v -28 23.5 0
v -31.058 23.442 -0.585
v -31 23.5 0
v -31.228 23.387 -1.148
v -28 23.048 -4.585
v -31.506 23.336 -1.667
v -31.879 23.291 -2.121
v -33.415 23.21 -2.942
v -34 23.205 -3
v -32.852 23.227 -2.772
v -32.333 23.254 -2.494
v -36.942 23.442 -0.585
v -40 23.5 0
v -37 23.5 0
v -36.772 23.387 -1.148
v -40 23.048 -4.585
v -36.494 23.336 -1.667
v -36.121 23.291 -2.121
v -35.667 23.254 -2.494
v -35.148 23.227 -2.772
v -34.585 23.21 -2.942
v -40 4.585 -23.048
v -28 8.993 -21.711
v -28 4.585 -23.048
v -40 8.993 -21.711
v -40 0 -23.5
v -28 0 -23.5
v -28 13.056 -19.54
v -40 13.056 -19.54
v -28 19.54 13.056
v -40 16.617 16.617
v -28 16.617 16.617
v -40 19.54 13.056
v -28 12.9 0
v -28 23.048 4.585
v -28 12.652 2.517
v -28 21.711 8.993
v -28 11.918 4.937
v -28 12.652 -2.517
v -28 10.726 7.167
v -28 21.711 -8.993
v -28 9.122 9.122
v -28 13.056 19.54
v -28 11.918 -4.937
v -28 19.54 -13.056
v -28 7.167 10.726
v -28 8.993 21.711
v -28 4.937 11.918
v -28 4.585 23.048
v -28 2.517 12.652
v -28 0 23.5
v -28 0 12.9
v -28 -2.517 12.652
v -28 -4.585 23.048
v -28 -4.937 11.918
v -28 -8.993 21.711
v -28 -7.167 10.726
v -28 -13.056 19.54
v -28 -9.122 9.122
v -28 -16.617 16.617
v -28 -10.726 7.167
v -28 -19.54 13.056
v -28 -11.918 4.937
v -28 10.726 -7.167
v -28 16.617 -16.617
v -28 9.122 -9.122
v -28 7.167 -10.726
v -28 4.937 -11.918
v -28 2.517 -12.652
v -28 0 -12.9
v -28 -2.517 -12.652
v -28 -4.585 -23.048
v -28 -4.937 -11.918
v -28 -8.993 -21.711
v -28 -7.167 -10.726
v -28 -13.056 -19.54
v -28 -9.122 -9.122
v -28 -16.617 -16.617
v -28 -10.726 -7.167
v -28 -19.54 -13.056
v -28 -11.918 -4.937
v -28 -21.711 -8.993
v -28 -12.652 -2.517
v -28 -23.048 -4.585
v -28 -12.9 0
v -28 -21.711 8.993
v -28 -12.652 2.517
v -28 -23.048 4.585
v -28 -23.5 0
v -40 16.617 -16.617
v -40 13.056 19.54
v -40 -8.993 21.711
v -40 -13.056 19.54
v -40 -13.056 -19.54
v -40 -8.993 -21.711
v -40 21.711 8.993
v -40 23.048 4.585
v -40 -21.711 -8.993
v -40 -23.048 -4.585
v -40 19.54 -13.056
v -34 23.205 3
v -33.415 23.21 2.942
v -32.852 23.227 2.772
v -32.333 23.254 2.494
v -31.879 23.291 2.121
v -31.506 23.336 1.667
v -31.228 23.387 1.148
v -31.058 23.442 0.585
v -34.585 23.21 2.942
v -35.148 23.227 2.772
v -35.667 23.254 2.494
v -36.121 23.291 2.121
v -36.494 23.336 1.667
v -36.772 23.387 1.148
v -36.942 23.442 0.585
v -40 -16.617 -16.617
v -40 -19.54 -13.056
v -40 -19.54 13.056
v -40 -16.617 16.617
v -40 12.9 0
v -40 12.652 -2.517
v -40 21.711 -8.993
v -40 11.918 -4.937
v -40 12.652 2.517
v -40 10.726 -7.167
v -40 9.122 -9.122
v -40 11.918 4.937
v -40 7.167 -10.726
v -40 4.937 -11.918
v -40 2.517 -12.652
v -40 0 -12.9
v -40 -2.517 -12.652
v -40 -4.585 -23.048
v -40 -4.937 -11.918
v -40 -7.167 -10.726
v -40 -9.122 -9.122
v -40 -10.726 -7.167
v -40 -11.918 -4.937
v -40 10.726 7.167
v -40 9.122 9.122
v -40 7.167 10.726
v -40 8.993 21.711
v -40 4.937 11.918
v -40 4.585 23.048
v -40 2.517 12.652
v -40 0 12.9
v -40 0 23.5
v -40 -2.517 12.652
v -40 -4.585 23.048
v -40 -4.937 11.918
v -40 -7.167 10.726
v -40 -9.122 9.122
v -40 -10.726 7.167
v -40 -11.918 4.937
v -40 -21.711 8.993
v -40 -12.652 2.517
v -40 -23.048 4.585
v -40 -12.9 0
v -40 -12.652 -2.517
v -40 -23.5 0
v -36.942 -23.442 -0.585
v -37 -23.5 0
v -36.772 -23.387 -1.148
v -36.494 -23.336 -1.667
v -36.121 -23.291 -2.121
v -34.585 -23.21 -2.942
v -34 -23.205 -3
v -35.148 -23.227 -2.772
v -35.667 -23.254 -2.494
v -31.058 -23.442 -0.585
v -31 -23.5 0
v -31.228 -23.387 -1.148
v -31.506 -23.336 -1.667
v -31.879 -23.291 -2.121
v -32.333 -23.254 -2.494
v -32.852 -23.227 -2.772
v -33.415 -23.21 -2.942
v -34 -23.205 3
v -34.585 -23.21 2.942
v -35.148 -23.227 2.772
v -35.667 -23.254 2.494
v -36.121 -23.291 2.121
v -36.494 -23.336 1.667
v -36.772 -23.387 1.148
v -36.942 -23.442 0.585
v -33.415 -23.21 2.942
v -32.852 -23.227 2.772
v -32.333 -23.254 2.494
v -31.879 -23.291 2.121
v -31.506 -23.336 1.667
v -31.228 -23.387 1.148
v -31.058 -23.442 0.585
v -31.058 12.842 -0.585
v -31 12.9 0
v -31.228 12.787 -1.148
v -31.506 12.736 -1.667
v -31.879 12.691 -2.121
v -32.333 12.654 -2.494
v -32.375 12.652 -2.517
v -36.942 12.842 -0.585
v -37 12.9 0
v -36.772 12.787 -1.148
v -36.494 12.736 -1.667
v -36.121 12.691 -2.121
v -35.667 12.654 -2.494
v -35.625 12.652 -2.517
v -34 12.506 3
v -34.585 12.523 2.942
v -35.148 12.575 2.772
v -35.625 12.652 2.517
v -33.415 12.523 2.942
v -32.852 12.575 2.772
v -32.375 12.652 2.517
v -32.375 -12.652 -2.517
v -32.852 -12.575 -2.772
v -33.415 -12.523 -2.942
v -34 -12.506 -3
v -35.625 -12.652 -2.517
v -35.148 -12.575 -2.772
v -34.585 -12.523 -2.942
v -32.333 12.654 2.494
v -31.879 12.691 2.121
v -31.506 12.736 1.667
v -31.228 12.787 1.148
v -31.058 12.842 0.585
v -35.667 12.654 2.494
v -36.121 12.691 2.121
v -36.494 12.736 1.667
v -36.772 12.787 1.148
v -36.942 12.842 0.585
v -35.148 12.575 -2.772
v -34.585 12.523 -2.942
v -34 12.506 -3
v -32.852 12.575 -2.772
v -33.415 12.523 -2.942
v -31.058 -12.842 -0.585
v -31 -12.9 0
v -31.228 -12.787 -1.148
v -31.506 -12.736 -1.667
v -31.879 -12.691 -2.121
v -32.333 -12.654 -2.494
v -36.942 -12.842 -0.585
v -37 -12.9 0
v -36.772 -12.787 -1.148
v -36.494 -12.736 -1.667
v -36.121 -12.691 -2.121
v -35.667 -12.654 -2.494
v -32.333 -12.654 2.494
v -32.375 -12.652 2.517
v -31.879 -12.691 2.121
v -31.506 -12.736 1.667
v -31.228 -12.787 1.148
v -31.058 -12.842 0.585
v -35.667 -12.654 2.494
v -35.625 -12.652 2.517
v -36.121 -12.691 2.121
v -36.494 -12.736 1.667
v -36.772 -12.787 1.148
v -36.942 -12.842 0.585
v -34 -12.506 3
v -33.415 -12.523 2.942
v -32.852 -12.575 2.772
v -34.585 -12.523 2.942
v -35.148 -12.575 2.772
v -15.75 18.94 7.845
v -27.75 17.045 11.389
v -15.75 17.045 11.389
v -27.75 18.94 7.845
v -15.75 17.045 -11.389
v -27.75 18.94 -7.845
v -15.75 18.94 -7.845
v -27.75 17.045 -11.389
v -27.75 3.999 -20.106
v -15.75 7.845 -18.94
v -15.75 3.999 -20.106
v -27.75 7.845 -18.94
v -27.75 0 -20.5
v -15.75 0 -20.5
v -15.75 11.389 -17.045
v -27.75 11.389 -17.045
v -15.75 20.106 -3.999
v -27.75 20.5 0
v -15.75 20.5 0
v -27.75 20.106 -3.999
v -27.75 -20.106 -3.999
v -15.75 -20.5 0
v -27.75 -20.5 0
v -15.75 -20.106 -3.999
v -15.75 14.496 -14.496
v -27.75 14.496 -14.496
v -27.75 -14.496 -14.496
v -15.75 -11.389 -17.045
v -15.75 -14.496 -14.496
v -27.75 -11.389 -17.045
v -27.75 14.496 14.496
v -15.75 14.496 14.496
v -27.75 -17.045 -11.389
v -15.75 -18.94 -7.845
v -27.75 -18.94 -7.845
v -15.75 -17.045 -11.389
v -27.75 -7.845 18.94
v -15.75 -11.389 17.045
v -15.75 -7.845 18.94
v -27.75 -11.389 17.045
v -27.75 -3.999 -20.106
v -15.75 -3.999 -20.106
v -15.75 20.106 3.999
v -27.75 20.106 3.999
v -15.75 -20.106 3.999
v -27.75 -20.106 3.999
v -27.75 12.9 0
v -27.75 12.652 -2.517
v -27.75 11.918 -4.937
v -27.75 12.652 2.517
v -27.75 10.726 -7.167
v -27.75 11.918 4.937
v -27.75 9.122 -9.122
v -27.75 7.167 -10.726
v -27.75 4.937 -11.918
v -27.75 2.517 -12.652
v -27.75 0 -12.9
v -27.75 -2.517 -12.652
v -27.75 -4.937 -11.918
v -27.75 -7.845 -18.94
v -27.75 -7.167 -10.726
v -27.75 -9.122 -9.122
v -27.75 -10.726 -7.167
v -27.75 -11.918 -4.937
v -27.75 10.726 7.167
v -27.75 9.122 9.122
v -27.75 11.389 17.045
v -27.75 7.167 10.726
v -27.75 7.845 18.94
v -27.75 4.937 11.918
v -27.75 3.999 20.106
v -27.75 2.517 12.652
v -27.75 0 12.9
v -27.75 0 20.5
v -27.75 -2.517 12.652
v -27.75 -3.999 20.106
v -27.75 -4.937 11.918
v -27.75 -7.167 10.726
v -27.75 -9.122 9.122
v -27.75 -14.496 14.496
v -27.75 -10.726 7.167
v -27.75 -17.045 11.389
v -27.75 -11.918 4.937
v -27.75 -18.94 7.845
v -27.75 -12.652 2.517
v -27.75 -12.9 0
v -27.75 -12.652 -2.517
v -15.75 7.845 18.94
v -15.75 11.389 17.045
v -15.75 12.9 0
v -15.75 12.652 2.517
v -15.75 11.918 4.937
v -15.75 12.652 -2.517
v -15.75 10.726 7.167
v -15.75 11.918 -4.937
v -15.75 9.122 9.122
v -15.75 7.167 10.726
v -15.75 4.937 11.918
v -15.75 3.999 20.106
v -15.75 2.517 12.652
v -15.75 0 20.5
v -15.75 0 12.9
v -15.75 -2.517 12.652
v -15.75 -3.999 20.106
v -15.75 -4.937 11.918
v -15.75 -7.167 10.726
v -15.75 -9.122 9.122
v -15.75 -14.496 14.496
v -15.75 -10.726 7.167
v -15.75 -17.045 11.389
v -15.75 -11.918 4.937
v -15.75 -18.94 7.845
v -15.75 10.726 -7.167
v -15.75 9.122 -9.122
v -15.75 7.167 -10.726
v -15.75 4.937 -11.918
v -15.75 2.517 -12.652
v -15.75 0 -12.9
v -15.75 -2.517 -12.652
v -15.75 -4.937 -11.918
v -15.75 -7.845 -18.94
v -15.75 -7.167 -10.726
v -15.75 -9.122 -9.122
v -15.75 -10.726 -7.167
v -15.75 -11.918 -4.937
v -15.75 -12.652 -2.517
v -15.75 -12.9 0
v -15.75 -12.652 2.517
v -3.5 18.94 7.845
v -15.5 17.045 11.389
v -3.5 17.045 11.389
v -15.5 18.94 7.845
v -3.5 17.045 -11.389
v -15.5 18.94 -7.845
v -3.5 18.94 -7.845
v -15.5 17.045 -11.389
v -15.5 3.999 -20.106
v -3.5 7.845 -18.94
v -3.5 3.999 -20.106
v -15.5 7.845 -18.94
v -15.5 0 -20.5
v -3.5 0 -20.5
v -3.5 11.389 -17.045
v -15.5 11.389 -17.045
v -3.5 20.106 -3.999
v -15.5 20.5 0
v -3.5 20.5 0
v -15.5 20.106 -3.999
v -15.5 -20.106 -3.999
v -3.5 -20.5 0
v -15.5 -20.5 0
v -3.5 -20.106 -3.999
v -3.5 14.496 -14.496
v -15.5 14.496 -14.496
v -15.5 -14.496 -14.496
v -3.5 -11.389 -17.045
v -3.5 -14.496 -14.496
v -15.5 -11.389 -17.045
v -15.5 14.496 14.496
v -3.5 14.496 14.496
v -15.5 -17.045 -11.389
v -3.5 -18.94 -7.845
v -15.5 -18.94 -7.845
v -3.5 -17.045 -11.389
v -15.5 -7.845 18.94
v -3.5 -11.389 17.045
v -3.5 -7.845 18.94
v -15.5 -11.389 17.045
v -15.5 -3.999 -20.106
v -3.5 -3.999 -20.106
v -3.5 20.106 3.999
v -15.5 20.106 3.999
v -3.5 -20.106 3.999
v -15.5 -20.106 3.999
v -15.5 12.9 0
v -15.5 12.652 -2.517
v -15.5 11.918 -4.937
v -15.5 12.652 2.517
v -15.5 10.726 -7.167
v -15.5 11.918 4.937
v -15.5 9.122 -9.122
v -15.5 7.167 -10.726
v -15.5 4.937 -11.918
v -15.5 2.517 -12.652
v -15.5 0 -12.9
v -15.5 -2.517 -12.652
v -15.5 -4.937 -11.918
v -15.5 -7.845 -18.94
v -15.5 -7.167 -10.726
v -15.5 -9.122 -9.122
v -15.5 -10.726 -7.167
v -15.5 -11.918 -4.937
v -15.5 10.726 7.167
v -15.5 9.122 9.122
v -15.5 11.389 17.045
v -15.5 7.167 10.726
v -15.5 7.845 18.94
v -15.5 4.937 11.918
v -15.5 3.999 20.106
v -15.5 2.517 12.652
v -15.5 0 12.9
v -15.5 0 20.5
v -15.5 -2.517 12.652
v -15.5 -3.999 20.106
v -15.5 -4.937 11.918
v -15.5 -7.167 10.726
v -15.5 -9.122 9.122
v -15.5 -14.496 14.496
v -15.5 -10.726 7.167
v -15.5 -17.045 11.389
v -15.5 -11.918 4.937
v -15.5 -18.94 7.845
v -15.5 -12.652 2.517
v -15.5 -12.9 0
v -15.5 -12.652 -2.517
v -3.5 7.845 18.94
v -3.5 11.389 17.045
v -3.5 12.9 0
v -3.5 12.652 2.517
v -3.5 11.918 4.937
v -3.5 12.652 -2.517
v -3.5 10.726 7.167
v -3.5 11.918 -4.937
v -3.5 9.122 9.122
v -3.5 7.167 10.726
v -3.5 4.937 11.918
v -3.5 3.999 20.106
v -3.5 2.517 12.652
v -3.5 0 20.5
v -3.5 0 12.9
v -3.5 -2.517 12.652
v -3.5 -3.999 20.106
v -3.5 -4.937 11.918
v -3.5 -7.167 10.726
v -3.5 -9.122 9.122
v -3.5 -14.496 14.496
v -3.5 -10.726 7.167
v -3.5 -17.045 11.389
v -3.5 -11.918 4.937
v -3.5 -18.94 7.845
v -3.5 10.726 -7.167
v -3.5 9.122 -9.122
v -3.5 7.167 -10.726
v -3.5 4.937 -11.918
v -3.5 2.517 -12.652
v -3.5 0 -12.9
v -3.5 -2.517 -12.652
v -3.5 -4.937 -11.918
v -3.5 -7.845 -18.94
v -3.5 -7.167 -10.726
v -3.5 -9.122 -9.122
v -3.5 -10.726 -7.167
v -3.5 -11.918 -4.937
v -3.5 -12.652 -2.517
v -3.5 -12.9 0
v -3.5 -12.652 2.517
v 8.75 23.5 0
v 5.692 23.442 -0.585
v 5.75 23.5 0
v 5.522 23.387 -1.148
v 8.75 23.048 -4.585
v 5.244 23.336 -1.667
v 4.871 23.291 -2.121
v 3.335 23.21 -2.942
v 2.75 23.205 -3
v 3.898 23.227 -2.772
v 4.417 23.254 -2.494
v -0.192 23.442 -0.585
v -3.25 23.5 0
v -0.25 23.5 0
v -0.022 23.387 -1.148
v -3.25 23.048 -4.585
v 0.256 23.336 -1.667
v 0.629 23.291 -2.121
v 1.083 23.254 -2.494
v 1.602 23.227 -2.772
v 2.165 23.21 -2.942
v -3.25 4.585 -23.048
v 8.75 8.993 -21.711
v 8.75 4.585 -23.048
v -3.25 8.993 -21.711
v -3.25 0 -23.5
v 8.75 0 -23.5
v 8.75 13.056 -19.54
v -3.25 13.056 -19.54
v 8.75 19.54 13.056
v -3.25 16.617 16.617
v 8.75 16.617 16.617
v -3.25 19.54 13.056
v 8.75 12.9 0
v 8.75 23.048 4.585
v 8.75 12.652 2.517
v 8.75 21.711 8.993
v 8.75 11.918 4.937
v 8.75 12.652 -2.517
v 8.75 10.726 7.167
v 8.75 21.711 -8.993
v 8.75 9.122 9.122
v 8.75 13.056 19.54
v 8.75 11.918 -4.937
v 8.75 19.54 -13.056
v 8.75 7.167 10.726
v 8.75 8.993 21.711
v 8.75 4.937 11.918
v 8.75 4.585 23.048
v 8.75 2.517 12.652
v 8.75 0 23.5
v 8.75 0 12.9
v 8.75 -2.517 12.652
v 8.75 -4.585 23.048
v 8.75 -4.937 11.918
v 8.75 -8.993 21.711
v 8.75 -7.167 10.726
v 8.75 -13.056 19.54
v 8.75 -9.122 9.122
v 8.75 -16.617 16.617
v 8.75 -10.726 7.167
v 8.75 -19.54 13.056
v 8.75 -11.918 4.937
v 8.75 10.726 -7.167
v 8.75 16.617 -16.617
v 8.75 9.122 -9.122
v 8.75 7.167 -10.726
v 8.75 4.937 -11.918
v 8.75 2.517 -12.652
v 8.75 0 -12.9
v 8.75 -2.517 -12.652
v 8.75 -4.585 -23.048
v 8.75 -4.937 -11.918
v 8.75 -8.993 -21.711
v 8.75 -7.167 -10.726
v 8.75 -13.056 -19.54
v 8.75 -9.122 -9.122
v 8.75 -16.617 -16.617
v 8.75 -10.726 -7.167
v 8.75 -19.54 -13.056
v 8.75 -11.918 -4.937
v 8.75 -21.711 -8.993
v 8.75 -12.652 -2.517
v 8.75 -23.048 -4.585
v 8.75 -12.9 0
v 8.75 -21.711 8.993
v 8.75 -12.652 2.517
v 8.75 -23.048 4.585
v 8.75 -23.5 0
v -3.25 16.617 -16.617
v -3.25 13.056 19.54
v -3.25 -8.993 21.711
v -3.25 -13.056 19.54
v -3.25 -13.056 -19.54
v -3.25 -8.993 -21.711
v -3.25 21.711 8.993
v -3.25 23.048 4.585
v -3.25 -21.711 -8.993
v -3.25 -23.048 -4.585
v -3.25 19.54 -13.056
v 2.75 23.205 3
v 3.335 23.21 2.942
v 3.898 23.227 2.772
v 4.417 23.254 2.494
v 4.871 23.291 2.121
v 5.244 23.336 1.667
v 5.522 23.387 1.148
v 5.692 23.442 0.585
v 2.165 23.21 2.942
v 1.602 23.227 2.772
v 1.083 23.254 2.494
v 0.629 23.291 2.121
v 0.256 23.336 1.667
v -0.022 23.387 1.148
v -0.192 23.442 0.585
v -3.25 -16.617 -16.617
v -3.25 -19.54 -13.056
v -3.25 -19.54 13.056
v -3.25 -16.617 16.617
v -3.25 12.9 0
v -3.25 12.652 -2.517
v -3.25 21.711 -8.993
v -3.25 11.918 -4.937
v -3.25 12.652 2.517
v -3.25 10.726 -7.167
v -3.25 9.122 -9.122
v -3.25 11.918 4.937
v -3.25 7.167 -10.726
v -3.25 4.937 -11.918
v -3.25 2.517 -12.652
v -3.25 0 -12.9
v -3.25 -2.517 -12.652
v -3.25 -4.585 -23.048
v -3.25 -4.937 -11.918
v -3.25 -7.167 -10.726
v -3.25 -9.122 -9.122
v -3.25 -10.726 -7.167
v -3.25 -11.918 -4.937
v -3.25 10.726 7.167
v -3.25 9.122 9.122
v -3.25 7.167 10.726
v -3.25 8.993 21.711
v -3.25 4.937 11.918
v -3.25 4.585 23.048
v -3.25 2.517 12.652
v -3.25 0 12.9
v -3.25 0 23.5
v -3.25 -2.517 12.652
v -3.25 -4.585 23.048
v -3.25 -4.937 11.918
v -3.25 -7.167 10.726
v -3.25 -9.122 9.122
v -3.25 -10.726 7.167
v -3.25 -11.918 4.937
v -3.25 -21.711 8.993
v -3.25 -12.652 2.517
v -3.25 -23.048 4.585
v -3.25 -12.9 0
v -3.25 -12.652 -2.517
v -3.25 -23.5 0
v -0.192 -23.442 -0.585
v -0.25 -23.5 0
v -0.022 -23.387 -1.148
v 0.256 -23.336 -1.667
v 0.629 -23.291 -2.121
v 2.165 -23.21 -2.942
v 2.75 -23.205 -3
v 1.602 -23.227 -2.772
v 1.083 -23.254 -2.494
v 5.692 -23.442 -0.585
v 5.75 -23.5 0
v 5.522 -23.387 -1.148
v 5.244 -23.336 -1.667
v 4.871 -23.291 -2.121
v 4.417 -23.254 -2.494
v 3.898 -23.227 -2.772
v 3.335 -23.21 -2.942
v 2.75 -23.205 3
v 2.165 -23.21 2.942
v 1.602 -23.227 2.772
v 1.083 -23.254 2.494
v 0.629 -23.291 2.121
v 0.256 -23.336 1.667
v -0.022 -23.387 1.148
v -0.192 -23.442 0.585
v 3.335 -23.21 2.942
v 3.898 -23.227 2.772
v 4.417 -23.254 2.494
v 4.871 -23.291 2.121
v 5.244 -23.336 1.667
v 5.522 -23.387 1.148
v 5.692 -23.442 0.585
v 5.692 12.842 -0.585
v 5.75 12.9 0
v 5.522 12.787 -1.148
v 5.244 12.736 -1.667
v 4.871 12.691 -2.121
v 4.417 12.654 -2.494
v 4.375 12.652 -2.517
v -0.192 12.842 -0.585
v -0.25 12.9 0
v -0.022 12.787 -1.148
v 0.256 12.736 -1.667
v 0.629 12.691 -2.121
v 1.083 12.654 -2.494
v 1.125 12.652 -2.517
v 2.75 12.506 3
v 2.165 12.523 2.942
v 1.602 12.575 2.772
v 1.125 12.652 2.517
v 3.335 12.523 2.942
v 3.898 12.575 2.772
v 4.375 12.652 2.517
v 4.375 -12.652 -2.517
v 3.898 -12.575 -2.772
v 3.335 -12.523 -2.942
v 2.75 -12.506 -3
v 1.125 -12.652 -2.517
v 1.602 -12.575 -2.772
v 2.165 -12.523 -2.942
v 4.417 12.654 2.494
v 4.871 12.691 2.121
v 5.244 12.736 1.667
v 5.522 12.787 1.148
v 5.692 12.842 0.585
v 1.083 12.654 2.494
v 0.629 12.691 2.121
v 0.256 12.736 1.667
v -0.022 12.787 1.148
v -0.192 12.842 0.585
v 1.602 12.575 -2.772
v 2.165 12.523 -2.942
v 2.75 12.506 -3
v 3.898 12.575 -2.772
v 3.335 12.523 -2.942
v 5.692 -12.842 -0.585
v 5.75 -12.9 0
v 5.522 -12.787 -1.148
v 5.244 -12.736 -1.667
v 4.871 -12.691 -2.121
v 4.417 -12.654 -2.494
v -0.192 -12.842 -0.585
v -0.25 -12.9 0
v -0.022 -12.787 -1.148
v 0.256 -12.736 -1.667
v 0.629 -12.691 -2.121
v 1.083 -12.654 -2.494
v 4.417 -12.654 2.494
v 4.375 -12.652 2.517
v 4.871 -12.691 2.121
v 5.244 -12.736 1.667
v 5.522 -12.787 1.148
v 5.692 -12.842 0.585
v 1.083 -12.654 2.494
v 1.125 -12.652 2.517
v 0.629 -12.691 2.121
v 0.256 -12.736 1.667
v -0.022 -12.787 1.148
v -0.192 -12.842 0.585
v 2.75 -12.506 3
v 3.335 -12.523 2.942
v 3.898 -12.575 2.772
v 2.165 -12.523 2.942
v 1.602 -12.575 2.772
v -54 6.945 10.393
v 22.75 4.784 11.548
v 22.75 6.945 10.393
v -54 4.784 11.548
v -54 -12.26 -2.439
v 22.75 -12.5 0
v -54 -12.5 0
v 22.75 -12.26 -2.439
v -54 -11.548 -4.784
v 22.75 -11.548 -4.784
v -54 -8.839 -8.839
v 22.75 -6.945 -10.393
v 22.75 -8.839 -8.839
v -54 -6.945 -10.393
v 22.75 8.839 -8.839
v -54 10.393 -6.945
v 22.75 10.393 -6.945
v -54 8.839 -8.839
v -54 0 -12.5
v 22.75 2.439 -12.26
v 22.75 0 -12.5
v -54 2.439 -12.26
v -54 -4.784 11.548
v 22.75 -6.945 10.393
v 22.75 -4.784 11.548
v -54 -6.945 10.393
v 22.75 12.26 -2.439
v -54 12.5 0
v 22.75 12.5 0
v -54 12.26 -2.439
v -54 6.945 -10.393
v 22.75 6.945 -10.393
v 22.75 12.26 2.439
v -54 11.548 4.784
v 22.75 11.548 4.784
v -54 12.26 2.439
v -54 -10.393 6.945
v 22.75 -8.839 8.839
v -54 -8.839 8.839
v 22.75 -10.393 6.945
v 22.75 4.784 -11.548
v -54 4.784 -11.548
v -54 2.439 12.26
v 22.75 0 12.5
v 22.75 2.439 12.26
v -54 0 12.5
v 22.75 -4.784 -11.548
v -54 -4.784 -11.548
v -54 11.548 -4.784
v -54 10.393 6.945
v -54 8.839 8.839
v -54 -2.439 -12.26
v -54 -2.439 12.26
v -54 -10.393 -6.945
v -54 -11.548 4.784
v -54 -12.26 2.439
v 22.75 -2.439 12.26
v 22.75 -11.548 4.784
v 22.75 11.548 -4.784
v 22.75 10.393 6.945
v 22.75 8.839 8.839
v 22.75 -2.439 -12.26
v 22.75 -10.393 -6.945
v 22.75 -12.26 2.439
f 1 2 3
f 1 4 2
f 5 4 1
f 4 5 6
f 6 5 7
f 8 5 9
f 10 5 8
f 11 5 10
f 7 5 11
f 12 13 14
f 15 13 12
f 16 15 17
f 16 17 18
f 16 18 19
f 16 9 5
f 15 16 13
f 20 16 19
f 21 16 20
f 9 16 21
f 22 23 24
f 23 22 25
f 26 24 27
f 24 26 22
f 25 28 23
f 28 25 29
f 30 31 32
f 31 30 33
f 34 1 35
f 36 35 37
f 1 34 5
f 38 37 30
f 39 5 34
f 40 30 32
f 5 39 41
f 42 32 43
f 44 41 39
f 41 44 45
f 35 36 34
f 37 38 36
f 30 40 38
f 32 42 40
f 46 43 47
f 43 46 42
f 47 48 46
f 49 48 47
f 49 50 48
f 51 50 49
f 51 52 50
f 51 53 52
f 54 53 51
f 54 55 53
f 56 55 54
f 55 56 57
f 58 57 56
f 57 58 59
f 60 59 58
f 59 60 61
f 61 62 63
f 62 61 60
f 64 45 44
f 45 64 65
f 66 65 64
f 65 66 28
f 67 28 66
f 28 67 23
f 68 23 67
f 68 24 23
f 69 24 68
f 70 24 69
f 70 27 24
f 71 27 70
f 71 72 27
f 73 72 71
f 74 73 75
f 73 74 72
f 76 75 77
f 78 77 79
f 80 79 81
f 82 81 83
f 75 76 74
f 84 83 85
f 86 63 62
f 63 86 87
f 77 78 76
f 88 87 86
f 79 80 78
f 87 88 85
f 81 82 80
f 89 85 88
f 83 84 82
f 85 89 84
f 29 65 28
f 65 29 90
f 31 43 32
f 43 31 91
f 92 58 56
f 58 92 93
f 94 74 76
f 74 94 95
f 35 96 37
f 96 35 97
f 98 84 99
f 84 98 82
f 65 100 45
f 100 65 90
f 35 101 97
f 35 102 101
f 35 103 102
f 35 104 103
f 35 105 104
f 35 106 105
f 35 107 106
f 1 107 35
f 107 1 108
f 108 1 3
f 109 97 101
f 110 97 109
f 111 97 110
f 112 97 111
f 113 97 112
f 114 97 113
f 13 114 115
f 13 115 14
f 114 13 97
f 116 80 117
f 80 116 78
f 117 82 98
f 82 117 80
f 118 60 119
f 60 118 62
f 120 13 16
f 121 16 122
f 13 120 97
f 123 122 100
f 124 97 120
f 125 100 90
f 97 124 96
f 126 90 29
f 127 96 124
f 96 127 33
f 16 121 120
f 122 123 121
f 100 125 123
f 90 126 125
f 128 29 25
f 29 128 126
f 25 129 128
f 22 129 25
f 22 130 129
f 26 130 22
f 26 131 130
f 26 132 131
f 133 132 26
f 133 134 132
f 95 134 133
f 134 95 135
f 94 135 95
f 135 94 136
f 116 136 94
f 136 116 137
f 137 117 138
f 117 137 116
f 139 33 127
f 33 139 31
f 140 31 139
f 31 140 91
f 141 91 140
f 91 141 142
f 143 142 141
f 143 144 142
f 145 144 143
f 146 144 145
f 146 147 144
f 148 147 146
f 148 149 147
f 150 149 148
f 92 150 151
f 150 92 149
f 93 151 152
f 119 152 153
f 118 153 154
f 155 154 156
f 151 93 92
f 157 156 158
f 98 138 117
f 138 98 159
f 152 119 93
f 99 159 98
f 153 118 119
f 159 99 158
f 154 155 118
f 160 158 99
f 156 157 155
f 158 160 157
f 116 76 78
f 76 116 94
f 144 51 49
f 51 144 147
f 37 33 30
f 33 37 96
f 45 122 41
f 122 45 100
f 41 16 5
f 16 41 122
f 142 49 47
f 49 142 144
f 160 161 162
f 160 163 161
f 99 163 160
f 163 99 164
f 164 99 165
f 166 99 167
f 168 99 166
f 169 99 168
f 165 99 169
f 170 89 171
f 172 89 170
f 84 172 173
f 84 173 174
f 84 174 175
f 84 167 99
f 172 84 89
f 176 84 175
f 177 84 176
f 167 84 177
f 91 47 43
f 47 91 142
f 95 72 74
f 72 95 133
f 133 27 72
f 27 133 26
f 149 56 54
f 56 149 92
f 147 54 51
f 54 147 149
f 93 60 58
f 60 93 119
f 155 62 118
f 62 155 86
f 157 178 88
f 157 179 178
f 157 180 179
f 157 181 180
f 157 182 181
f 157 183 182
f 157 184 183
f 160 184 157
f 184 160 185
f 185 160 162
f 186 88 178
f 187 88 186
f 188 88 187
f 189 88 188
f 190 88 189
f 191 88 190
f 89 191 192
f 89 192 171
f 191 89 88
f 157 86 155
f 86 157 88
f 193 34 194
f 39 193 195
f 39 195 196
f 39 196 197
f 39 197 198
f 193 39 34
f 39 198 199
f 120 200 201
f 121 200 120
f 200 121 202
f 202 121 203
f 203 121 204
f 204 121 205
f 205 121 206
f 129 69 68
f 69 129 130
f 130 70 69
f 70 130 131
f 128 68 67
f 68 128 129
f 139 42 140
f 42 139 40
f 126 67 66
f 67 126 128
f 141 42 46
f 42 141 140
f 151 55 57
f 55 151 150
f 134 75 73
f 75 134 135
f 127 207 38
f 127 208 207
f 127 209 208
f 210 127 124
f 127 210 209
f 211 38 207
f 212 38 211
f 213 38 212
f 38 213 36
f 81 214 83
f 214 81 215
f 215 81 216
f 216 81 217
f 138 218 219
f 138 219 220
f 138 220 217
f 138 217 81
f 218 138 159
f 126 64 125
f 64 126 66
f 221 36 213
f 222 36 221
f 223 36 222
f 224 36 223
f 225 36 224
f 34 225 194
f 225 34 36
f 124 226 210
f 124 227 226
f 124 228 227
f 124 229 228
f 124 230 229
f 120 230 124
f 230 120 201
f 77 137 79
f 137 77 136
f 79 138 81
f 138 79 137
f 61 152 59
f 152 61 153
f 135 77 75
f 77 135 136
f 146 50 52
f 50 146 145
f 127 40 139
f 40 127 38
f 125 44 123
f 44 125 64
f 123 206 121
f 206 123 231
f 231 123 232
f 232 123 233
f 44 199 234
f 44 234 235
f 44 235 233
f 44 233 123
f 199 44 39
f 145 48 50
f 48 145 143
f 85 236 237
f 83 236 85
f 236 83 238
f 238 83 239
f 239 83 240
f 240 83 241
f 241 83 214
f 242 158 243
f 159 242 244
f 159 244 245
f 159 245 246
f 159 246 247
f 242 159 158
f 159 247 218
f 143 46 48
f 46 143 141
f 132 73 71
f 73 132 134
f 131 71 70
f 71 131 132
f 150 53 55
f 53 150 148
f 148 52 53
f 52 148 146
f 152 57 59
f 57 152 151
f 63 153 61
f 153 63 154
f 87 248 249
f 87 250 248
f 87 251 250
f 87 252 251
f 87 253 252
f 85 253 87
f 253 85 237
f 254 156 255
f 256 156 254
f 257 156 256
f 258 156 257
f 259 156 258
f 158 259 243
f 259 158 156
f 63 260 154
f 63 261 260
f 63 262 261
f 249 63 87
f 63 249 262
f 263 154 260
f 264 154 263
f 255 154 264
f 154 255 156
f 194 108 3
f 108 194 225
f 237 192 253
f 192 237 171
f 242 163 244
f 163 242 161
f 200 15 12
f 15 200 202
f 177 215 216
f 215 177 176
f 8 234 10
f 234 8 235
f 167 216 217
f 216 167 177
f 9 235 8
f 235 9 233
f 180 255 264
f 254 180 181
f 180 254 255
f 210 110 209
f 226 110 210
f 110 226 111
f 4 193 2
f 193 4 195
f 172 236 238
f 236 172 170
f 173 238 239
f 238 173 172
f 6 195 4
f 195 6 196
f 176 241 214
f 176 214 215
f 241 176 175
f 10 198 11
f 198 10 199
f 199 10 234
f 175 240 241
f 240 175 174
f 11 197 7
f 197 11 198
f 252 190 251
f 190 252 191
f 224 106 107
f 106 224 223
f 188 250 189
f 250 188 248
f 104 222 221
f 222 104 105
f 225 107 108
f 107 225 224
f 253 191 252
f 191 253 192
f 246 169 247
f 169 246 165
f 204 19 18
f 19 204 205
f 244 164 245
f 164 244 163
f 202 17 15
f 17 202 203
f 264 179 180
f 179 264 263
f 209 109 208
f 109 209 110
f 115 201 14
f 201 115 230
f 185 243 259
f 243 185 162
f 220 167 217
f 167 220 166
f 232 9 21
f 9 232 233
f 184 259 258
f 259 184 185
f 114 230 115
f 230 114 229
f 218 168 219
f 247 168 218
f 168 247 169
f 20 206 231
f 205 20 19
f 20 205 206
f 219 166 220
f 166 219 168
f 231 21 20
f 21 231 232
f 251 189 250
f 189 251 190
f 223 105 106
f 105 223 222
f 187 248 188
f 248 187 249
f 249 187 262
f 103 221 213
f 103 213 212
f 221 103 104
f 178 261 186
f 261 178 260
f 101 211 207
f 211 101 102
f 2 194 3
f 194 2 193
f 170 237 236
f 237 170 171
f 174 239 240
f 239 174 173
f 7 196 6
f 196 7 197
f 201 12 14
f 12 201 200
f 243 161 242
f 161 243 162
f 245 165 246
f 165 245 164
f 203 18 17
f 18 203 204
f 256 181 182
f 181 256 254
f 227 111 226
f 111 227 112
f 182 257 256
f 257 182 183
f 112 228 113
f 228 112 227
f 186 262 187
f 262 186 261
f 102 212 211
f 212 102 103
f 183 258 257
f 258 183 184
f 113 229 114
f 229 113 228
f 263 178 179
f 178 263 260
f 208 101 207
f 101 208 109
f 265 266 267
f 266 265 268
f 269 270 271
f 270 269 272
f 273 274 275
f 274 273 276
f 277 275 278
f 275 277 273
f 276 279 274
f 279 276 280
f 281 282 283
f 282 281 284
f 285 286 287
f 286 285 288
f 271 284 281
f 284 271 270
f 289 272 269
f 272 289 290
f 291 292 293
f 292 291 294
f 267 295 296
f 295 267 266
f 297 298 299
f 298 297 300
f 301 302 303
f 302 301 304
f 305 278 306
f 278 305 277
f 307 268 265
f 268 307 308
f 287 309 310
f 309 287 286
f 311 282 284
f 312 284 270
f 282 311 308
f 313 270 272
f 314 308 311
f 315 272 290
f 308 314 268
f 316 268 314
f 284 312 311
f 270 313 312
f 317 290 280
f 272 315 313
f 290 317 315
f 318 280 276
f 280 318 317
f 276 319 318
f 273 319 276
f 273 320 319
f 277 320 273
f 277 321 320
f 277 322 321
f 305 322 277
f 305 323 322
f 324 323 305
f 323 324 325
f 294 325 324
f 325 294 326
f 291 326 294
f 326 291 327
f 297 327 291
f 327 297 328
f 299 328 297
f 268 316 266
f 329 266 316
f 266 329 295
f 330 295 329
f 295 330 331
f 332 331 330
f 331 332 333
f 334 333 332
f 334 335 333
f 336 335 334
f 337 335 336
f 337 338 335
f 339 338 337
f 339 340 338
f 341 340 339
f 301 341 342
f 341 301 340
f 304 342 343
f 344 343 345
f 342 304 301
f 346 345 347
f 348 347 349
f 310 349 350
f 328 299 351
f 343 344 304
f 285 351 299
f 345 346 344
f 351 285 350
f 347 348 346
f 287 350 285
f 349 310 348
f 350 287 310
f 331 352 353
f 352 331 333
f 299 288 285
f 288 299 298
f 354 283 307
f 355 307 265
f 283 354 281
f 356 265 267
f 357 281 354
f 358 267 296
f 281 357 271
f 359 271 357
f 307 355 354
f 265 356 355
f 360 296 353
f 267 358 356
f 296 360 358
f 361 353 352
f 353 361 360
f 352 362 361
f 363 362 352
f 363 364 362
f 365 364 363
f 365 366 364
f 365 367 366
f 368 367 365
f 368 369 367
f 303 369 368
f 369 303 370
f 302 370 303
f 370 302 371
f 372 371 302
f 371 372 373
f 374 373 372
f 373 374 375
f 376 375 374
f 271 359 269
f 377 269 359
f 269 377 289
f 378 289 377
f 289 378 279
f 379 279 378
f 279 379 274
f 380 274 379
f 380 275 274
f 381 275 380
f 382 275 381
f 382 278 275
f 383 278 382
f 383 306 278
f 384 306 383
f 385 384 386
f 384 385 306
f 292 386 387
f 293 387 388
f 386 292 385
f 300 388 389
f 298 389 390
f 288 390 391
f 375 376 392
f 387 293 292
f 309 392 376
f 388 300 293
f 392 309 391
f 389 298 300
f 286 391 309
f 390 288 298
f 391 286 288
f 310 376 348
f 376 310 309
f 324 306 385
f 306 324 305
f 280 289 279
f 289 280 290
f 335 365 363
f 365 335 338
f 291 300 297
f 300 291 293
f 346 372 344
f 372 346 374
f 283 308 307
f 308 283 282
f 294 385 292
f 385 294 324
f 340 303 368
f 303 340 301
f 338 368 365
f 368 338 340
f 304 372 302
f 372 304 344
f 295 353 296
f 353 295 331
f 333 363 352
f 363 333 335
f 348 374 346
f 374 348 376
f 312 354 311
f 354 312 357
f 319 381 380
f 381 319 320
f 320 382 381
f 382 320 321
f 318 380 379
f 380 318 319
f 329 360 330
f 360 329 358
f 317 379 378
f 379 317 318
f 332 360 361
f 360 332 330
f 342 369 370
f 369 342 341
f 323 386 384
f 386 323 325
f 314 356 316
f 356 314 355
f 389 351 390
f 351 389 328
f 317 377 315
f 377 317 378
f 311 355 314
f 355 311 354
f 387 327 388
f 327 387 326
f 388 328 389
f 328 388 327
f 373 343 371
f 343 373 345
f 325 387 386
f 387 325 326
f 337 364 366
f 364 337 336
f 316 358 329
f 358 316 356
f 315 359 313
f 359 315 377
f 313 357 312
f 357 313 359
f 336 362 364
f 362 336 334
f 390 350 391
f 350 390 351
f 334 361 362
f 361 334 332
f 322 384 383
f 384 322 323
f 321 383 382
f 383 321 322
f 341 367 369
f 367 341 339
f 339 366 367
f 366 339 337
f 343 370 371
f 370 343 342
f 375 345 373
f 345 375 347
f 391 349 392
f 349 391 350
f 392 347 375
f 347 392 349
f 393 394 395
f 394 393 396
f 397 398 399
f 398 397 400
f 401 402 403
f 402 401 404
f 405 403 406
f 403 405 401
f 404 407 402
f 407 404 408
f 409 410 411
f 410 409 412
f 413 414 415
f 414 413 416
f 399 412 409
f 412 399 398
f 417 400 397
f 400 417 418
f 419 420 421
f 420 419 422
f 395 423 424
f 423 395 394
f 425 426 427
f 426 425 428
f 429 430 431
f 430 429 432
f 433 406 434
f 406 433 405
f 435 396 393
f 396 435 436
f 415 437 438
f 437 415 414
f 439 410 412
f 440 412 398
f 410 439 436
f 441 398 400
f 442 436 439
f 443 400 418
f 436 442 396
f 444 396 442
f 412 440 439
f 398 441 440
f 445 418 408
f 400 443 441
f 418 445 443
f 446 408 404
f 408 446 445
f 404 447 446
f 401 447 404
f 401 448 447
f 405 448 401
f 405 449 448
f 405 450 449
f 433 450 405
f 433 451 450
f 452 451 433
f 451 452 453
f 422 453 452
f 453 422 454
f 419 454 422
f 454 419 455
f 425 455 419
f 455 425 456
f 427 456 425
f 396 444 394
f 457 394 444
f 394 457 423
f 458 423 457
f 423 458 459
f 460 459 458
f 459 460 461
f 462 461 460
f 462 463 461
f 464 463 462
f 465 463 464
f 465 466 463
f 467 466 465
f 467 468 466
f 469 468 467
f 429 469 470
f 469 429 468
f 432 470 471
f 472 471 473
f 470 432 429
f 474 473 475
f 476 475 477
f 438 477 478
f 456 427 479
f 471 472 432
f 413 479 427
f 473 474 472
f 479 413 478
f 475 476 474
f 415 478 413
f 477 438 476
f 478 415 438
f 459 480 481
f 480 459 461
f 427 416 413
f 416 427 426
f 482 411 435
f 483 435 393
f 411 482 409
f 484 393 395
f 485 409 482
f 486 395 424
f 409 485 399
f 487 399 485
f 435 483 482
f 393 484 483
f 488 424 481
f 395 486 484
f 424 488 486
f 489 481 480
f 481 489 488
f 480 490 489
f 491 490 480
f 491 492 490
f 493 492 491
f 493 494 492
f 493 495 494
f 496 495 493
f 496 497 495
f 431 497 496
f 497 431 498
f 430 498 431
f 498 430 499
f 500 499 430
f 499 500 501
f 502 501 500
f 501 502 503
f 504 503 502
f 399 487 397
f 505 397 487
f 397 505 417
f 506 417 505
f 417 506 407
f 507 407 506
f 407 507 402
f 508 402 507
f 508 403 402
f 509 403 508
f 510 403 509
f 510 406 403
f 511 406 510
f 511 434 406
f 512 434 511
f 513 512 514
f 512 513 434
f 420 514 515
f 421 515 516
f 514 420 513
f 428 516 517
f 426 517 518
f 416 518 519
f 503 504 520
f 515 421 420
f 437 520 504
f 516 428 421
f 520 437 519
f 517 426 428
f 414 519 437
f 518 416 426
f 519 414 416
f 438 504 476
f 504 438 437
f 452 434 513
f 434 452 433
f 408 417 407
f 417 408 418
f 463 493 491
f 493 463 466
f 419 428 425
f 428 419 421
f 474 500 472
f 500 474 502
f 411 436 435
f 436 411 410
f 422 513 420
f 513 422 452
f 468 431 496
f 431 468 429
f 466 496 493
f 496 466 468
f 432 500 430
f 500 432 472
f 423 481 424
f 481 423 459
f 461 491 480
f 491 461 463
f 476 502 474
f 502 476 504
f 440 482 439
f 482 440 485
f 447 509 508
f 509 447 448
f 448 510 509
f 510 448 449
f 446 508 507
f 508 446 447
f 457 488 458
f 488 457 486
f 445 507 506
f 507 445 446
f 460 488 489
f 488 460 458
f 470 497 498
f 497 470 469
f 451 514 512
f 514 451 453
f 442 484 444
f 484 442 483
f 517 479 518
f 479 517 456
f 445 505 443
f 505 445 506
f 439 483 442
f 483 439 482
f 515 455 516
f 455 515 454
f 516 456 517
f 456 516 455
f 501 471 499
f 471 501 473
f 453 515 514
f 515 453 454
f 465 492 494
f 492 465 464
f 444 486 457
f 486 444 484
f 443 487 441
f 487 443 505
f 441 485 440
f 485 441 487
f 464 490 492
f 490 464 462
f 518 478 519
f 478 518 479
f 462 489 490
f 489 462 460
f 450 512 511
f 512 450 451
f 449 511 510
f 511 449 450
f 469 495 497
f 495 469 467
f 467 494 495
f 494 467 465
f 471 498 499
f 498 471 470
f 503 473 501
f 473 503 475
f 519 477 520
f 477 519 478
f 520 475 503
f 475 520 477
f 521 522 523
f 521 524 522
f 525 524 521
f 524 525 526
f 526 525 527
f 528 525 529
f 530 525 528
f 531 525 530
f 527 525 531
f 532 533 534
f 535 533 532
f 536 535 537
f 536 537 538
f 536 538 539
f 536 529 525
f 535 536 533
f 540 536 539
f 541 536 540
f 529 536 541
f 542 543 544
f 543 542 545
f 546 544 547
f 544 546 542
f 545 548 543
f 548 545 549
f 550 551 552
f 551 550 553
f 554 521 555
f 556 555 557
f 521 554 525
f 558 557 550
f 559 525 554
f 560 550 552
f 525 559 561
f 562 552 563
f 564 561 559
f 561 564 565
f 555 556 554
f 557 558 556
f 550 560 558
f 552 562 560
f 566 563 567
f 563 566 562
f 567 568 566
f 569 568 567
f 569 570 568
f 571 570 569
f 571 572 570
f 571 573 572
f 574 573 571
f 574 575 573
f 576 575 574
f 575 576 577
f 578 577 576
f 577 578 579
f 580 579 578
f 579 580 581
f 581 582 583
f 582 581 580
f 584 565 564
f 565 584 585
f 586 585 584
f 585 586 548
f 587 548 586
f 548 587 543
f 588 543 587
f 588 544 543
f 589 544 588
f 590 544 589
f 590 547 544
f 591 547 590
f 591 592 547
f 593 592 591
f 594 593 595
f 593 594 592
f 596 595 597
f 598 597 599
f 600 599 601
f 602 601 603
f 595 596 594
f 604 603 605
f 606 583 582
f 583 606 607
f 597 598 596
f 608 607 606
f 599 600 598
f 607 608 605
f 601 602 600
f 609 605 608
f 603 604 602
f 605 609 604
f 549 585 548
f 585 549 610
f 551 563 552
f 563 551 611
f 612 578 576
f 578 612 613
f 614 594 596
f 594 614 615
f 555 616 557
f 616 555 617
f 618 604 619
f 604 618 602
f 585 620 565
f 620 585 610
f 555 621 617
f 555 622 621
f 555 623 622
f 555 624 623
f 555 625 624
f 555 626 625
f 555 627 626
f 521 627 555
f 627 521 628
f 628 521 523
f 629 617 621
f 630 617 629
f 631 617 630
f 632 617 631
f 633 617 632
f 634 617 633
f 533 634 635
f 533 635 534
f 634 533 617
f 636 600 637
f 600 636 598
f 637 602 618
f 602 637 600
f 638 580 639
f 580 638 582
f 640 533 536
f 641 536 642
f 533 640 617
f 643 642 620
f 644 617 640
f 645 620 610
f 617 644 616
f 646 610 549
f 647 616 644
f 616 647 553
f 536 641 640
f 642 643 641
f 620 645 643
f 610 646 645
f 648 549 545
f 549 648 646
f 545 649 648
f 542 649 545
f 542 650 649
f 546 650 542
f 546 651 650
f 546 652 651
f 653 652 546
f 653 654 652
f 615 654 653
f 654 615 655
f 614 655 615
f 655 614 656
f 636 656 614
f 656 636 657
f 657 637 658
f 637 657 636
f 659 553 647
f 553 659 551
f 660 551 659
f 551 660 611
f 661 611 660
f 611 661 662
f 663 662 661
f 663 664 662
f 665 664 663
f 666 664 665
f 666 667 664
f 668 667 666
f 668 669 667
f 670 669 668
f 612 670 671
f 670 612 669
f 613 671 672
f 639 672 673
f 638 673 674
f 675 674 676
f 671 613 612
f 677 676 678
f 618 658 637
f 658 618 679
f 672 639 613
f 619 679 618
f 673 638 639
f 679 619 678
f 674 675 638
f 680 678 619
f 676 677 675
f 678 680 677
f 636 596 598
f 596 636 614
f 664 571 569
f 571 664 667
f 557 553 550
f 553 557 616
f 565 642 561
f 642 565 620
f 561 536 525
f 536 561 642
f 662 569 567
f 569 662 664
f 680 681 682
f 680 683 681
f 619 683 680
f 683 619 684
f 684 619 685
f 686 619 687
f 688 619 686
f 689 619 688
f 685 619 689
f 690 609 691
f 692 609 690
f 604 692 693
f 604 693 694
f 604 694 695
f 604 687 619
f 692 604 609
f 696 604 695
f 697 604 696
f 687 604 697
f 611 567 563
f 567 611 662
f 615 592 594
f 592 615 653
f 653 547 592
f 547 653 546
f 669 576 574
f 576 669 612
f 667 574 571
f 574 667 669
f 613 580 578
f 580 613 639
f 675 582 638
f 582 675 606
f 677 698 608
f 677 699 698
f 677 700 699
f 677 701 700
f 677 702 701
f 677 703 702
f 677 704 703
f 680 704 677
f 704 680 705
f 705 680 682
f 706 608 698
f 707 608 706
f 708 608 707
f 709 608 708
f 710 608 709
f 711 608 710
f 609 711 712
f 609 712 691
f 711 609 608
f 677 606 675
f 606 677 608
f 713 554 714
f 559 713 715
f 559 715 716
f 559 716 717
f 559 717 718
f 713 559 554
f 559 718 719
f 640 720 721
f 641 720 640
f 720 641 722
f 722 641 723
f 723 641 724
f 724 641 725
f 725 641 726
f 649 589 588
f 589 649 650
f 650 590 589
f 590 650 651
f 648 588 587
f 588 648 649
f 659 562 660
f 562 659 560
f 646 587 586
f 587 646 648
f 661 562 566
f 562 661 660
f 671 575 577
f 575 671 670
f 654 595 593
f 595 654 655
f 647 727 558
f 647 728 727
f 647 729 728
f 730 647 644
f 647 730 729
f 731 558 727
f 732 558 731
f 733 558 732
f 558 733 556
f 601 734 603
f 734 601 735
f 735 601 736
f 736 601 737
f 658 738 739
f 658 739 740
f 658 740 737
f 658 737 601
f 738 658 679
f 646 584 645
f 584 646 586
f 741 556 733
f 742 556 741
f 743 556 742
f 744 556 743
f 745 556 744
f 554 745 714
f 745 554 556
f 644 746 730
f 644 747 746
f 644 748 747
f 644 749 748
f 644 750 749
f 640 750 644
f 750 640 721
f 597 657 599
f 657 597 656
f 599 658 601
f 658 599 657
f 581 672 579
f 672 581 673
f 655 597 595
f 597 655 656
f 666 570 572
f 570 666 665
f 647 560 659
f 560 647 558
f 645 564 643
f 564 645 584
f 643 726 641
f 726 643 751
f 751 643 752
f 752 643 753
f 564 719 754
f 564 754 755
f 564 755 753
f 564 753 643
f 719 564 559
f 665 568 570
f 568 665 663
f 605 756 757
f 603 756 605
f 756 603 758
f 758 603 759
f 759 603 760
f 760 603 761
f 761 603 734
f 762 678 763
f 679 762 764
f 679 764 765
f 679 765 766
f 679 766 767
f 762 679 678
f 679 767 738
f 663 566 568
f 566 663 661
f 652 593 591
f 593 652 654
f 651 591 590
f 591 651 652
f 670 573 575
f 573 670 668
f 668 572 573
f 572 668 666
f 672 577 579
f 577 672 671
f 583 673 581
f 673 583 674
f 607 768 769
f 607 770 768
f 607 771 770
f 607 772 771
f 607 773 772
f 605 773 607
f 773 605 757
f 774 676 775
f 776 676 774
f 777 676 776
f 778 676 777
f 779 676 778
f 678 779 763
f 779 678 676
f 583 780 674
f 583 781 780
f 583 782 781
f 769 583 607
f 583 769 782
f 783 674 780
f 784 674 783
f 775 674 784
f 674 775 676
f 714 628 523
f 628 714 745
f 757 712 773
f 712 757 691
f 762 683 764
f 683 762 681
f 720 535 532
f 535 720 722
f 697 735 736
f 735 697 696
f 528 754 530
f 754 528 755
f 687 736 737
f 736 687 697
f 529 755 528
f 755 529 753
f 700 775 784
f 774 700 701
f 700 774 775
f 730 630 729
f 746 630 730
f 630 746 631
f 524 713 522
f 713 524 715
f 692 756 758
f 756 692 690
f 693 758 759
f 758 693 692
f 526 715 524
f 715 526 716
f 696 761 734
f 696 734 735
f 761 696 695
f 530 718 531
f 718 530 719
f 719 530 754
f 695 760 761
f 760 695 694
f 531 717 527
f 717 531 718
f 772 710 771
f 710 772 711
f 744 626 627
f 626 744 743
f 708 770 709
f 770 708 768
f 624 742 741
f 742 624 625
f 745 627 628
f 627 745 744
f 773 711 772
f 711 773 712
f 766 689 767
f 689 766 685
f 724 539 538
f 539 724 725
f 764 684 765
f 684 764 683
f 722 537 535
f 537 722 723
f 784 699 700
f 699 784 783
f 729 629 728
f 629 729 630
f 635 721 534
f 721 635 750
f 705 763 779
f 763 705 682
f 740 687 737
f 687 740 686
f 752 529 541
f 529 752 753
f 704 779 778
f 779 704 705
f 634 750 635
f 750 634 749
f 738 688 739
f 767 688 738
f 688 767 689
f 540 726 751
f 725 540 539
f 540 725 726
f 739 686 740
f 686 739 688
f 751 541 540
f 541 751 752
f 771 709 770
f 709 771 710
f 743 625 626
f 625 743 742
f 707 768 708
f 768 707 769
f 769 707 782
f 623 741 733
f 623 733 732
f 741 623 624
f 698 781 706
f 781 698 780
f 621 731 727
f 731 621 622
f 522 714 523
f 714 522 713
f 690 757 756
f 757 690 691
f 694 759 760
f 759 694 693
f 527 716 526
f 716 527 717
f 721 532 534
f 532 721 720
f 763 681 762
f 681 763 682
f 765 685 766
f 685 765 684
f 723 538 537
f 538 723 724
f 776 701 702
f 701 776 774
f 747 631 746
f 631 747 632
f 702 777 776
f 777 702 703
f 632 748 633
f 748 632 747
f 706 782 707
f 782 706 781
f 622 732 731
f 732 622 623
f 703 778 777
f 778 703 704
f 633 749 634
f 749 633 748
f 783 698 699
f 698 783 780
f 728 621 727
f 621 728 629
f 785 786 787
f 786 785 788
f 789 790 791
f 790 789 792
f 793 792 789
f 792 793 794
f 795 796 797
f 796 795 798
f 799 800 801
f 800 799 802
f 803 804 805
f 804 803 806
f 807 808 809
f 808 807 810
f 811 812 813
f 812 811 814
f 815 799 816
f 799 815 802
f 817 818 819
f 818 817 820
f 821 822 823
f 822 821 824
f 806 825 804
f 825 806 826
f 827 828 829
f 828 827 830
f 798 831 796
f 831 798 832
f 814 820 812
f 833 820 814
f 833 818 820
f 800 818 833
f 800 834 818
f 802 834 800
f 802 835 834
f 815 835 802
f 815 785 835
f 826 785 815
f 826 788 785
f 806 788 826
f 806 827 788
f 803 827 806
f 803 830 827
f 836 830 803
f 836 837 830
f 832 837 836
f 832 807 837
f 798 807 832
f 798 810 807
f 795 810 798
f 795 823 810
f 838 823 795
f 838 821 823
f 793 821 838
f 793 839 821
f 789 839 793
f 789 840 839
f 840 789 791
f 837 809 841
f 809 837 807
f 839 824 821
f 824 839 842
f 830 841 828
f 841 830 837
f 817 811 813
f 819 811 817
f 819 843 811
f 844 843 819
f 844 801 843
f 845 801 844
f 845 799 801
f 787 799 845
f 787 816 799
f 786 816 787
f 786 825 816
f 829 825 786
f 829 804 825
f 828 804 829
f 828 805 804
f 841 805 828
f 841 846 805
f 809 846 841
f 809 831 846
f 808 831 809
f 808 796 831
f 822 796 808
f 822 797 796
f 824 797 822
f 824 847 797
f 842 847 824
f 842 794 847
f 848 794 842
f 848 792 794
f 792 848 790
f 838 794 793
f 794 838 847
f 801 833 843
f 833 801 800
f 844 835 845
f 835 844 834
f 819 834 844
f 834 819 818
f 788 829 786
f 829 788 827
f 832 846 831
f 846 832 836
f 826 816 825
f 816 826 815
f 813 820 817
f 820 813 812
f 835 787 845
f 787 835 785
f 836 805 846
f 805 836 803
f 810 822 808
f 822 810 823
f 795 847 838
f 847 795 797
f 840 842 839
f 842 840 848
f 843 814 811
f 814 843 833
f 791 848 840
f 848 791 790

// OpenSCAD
$fn = 32;

// ------------------------------------------------------------------------
// Shaft with rings and collars: d25 shaft, 4 rings
// Every part is its own module, assembly() places them once.
// ------------------------------------------------------------------------

// --- part 1 ---
module shaft() {
  translate([0, 0, -38.375]) cylinder(h = 76.75, d = 25);
}

// --- part 2 ---
module collar_a() {
  difference() {
    cylinder(h = 12, d = 47);
    translate([0, 0, -1]) cylinder(h = 14, d = 25.8);
    translate([0, 0, 6]) rotate([90, 0, 0]) cylinder(h = 49, d = 6, center = true);
  }
}

// --- part 3 ---
module spacer_a() {
  difference() {
      translate([0, 0, 0]) cylinder(h = 12, d = 41);
      translate([0, 0, -1]) cylinder(h = 14, d = 25.8);
    }
}

// --- part 4 ---
module spacer_b() {
  difference() {
      translate([0, 0, 0]) cylinder(h = 12, d = 41);
      translate([0, 0, -1]) cylinder(h = 14, d = 25.8);
    }
}

// --- part 5 ---
module collar_b() {
  difference() {
    cylinder(h = 12, d = 47);
    translate([0, 0, -1]) cylinder(h = 14, d = 25.8);
    translate([0, 0, 6]) rotate([90, 0, 0]) cylinder(h = 49, d = 6, center = true);
  }
}

// --- assembly ---
module assembly() {
  translate([-15.625, 0, 0]) rotate([0, 90, 0]) shaft();
  translate([-40, 0, 0]) rotate([0, 90, 0]) collar_a();
  translate([-27.75, 0, 0]) rotate([0, 90, 0]) spacer_a();
  translate([-15.5, 0, 0]) rotate([0, 90, 0]) spacer_b();
  translate([-3.25, 0, 0]) rotate([0, 90, 0]) collar_b();
}

assembly();
